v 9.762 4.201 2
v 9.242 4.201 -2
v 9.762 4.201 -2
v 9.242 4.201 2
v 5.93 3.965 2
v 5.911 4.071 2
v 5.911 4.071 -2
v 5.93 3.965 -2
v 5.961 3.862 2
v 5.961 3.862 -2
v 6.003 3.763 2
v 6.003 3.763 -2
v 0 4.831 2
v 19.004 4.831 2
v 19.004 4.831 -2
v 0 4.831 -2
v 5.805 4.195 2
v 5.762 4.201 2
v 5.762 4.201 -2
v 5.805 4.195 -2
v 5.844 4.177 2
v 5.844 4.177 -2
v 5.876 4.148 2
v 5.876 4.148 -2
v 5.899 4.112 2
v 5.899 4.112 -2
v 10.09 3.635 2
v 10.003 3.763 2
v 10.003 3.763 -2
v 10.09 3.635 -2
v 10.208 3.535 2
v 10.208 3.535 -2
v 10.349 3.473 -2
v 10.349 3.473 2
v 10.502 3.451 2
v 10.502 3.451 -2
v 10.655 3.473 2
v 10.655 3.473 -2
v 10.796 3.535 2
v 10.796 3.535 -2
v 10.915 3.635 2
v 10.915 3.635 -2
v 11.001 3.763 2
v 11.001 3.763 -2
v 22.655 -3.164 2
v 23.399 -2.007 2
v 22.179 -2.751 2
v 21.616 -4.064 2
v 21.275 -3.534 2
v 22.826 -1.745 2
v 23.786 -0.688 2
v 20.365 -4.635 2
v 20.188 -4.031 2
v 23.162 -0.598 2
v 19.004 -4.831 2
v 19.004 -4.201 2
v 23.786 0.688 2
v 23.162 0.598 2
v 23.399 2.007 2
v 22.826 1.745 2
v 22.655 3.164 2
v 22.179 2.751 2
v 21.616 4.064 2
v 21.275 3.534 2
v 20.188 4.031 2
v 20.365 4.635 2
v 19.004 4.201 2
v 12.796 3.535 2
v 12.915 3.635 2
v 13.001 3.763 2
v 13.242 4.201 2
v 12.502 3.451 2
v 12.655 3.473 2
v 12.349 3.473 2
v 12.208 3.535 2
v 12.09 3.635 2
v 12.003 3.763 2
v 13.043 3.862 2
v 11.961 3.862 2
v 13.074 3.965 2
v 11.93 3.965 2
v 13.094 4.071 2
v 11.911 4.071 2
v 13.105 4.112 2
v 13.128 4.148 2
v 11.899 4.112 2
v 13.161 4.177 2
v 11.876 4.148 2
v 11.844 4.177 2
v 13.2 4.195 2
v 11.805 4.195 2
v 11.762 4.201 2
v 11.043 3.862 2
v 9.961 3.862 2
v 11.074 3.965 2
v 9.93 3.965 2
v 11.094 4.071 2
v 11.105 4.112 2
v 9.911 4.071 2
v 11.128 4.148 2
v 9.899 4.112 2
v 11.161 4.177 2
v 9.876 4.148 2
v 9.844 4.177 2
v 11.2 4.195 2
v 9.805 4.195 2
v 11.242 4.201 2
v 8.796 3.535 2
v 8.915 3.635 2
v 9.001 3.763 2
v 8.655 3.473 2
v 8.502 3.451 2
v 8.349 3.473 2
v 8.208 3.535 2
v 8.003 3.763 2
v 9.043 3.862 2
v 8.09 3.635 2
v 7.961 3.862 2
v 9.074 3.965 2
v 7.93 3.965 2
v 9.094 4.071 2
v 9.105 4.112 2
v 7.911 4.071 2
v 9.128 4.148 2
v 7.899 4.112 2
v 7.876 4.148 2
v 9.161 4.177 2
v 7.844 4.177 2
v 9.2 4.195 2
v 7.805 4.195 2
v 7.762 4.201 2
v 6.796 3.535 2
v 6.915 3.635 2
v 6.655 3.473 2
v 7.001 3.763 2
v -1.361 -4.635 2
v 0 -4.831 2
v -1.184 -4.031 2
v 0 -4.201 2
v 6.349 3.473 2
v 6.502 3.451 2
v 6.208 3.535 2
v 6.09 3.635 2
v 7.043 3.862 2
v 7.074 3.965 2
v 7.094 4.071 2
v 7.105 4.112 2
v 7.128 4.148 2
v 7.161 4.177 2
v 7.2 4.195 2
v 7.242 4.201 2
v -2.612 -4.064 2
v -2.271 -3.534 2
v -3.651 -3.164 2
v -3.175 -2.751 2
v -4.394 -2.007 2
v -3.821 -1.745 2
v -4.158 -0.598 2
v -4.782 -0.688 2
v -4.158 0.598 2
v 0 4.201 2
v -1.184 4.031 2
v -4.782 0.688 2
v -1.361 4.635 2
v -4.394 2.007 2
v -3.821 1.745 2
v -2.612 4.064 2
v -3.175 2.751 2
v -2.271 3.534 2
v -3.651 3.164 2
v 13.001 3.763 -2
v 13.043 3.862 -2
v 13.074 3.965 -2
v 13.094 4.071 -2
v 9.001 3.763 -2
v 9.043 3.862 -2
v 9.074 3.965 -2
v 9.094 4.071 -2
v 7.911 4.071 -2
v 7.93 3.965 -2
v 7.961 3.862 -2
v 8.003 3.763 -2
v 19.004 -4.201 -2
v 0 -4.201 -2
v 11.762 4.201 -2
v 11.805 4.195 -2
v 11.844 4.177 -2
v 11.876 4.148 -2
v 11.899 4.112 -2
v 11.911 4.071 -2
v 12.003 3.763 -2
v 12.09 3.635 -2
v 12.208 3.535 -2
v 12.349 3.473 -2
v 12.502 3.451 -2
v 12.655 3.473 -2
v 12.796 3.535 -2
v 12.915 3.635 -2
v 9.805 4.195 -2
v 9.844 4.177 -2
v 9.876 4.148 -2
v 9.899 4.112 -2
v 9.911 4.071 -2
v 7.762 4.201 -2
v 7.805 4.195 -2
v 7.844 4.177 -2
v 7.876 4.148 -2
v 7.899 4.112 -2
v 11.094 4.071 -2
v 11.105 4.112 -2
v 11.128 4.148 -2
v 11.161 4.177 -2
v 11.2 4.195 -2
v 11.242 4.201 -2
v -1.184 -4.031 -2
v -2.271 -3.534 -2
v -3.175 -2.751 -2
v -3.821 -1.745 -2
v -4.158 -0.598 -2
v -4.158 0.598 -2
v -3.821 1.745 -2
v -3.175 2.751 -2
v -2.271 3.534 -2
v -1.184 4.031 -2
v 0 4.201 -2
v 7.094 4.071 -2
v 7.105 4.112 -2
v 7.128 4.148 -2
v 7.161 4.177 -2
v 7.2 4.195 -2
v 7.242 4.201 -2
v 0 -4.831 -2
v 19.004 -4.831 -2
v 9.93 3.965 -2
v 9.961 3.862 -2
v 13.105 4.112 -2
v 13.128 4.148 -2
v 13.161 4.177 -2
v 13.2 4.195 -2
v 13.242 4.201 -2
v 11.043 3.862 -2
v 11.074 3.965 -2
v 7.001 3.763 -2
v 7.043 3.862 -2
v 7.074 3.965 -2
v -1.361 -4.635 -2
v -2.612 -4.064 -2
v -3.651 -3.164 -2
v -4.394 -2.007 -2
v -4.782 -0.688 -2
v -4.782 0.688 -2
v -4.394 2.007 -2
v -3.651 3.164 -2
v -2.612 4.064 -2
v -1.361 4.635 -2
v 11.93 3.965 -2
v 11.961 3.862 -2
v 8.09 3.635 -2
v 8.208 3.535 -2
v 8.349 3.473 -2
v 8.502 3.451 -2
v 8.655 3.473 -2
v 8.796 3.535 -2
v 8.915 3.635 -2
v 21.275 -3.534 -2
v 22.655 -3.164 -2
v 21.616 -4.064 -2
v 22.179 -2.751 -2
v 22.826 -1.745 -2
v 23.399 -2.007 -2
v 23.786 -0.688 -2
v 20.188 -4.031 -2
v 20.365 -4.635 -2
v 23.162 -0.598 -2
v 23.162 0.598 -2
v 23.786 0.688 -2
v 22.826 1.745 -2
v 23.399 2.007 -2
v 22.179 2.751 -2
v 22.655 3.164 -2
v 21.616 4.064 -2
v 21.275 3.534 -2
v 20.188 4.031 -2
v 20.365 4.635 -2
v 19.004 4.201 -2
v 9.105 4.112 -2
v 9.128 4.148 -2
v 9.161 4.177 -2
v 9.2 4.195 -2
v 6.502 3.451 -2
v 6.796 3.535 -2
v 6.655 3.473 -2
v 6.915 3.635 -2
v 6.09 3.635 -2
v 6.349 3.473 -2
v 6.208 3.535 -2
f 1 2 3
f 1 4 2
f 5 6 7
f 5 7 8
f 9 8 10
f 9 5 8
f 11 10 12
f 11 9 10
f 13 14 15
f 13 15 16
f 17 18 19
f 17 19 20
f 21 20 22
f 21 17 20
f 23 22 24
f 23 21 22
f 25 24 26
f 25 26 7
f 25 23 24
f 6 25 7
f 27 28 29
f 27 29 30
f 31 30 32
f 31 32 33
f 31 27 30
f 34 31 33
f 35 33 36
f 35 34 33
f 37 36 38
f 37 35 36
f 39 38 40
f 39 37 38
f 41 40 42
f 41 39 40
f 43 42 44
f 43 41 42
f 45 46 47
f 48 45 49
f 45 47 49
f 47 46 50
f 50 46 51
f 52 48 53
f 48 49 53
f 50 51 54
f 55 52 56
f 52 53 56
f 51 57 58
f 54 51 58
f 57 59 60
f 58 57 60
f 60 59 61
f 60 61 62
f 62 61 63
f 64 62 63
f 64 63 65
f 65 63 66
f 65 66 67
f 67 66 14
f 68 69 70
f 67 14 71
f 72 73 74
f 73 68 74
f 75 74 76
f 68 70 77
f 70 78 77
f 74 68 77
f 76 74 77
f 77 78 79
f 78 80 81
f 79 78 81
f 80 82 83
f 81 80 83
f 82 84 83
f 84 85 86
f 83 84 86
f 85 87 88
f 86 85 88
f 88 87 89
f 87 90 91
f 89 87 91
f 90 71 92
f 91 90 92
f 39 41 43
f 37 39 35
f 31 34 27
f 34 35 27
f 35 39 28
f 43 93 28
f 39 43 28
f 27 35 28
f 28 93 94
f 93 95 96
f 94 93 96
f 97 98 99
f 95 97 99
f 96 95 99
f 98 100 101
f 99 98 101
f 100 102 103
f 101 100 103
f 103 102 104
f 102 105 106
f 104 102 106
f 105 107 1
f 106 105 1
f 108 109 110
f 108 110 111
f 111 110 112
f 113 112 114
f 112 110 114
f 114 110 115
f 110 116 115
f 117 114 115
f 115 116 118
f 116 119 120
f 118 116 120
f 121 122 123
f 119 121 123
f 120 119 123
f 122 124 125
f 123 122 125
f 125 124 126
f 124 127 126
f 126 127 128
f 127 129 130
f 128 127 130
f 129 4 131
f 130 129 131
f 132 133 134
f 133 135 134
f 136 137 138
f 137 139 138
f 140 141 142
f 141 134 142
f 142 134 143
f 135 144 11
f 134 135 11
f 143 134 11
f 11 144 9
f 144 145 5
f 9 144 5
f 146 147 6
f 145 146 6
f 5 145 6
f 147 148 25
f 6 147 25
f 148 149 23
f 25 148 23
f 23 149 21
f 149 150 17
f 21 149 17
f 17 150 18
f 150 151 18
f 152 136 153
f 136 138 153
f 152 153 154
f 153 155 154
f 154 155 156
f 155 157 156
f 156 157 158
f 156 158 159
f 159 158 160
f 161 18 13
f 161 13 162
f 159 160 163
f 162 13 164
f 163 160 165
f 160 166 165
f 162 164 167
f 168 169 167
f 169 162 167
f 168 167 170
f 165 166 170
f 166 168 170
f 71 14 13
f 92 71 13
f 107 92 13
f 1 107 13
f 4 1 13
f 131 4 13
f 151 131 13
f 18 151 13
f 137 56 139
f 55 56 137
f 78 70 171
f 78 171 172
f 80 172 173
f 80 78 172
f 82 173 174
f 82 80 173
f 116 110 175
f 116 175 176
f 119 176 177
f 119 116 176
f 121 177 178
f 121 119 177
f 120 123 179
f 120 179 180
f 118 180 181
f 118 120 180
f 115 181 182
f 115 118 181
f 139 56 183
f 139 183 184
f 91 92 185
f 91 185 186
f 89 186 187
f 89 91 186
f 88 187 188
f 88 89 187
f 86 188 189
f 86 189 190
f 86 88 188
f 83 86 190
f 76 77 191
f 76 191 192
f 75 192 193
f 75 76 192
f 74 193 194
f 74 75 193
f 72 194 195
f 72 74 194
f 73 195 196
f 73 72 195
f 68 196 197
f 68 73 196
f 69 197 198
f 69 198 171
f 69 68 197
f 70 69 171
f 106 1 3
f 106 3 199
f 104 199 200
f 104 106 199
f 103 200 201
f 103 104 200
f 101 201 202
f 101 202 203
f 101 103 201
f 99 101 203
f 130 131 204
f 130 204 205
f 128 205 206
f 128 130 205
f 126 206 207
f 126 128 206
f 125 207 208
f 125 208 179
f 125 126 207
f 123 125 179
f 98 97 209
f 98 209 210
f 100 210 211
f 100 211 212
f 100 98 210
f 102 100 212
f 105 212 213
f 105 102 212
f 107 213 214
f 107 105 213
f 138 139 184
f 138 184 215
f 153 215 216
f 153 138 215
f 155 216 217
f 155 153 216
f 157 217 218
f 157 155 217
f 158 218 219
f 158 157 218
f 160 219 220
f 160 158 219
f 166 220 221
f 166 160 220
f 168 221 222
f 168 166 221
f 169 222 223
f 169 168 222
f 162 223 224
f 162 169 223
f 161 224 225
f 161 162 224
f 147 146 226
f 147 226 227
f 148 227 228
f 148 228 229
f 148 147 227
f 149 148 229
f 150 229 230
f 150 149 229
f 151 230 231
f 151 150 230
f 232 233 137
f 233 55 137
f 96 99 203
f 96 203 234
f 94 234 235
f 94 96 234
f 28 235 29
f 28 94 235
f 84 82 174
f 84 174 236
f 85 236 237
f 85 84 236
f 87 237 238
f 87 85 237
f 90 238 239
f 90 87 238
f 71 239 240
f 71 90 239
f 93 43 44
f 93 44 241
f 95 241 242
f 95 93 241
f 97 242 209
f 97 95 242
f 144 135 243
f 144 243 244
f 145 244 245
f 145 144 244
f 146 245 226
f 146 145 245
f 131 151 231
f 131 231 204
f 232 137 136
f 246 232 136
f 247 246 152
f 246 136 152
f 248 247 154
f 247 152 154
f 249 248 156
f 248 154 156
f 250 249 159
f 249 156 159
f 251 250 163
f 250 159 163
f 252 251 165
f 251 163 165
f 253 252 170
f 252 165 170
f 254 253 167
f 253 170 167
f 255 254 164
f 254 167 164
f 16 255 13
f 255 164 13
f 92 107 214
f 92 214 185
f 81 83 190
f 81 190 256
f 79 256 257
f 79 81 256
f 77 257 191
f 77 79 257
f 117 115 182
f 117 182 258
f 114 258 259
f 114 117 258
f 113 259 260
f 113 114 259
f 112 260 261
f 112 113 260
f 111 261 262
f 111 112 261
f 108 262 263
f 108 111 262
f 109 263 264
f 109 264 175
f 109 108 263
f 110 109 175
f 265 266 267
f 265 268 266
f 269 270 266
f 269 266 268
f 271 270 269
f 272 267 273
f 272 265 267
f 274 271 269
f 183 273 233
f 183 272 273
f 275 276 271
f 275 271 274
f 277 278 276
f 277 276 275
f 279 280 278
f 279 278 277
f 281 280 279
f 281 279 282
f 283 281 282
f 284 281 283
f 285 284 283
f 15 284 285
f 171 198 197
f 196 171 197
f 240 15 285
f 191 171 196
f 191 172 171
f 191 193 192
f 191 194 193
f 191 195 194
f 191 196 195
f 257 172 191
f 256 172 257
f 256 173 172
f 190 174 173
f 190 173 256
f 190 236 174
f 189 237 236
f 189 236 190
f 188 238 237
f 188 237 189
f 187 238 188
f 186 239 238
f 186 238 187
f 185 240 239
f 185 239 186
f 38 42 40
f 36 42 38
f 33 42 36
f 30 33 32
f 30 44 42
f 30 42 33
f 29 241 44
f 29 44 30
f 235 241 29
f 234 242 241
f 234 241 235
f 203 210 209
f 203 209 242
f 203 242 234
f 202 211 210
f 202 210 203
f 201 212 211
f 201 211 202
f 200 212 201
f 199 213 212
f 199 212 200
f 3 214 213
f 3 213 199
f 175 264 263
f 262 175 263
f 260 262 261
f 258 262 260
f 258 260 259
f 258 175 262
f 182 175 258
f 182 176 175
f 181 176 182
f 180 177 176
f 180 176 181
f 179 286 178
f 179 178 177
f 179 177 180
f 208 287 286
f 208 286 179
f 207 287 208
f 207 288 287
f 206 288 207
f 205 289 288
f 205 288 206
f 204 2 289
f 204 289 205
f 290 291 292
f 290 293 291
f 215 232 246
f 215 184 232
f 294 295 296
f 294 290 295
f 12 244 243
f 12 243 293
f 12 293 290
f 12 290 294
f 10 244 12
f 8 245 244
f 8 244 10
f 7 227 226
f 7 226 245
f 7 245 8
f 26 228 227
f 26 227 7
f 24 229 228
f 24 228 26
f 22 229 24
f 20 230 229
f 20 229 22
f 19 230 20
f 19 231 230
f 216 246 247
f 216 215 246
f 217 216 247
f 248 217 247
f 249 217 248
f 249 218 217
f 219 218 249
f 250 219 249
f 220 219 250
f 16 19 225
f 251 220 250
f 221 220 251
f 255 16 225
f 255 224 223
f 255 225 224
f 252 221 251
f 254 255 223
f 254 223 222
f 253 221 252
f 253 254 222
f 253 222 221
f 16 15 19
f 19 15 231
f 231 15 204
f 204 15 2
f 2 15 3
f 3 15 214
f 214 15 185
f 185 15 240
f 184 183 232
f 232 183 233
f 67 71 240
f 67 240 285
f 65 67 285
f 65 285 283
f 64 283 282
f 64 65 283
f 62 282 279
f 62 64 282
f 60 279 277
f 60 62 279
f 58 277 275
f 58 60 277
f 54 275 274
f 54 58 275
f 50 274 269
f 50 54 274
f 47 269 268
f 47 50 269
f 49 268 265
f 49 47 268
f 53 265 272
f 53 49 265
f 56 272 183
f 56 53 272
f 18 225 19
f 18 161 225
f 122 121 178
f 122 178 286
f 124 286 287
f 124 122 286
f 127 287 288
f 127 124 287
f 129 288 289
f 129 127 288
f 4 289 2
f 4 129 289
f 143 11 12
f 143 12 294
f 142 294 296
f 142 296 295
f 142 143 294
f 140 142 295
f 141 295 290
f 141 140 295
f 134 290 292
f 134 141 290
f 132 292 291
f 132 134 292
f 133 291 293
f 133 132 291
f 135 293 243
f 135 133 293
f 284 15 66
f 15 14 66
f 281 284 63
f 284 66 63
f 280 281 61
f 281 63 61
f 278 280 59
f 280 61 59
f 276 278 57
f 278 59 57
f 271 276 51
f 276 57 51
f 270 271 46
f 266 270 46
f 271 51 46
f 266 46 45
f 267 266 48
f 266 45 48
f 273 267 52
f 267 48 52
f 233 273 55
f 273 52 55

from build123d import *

# Parameters (mm, degrees)
BOSS_EXTRUDE1_DEPTH = 2
BOSS_EXTRUDE2_DEPTH = 2
LPATTERN1_COUNT     = 2
LPATTERN1_PITCH     = 4


with BuildPart() as part:
    # Sketch1 → Boss-Extrude1 (new body, symmetric)
    with BuildSketch(Plane.XY):
        with BuildLine():
            Line((0, 4.831), (19.004204728, 4.831))
            ThreePointArc((19.004204728, 4.831), (23.835204728, 0), (19.004204728, -4.831))
            Line((19.004204728, -4.831), (0, -4.831))
            ThreePointArc((0, -4.831), (-4.831, 0), (0, 4.831))
        make_face()
        with BuildLine():
            Line((0, 4.201), (19.004204728, 4.201))
            ThreePointArc((19.004204728, 4.201), (23.205204728, 0), (19.004204728, -4.201))
            Line((19.004204728, -4.201), (0, -4.201))
            ThreePointArc((0, -4.201), (-4.201, 0), (0, 4.201))
        make_face(mode=Mode.SUBTRACT)
    extrude(amount=BOSS_EXTRUDE1_DEPTH, both=True)

    # Sketch2 → Boss-Extrude2 (add, symmetric)
    with BuildSketch(Plane.XY):
        with BuildLine():
            Line((5.502102364, 4.831), (5.502102364, 4.201))
            Line((5.502102364, 4.201), (5.761926939, 4.201))
            ThreePointArc((5.761926939, 4.201), (5.86083401, 4.163771412), (5.910645473, 4.070565217))
            ThreePointArc((5.910645473, 4.070565217), (5.94449065, 3.912937846), (6.00322596, 3.762797753))
            ThreePointArc((6.00322596, 3.762797753), (6.502102364, 3.451), (7.000978769, 3.762797753))
            ThreePointArc((7.000978769, 3.762797753), (7.059714078, 3.912937846), (7.093559256, 4.070565217))
            ThreePointArc((7.093559256, 4.070565217), (7.143370718, 4.163771412), (7.242277789, 4.201))
            Line((7.242277789, 4.201), (7.761926939, 4.201))
            ThreePointArc((7.761926939, 4.201), (7.86083401, 4.163771412), (7.910645473, 4.070565217))
            ThreePointArc((7.910645473, 4.070565217), (7.94449065, 3.912937846), (8.00322596, 3.762797753))
            ThreePointArc((8.00322596, 3.762797753), (8.502102364, 3.451), (9.000978769, 3.762797753))
            ThreePointArc((9.000978769, 3.762797753), (9.059714078, 3.912937846), (9.093559256, 4.070565217))
            ThreePointArc((9.093559256, 4.070565217), (9.143370718, 4.163771412), (9.242277789, 4.201))
            Line((9.242277789, 4.201), (9.502102364, 4.201))
            Line((9.502102364, 4.201), (9.502102364, 4.831))
            Line((9.502102364, 4.831), (5.502102364, 4.831))
        make_face()
    boss_extrude2 = extrude(amount=BOSS_EXTRUDE2_DEPTH, both=True)

    # LPattern1: Boss-Extrude2 ×2
    with Locations(*[(i * LPATTERN1_PITCH, 0, 0) for i in range(1, LPATTERN1_COUNT)]):
        add(boss_extrude2)


solid = part.part
